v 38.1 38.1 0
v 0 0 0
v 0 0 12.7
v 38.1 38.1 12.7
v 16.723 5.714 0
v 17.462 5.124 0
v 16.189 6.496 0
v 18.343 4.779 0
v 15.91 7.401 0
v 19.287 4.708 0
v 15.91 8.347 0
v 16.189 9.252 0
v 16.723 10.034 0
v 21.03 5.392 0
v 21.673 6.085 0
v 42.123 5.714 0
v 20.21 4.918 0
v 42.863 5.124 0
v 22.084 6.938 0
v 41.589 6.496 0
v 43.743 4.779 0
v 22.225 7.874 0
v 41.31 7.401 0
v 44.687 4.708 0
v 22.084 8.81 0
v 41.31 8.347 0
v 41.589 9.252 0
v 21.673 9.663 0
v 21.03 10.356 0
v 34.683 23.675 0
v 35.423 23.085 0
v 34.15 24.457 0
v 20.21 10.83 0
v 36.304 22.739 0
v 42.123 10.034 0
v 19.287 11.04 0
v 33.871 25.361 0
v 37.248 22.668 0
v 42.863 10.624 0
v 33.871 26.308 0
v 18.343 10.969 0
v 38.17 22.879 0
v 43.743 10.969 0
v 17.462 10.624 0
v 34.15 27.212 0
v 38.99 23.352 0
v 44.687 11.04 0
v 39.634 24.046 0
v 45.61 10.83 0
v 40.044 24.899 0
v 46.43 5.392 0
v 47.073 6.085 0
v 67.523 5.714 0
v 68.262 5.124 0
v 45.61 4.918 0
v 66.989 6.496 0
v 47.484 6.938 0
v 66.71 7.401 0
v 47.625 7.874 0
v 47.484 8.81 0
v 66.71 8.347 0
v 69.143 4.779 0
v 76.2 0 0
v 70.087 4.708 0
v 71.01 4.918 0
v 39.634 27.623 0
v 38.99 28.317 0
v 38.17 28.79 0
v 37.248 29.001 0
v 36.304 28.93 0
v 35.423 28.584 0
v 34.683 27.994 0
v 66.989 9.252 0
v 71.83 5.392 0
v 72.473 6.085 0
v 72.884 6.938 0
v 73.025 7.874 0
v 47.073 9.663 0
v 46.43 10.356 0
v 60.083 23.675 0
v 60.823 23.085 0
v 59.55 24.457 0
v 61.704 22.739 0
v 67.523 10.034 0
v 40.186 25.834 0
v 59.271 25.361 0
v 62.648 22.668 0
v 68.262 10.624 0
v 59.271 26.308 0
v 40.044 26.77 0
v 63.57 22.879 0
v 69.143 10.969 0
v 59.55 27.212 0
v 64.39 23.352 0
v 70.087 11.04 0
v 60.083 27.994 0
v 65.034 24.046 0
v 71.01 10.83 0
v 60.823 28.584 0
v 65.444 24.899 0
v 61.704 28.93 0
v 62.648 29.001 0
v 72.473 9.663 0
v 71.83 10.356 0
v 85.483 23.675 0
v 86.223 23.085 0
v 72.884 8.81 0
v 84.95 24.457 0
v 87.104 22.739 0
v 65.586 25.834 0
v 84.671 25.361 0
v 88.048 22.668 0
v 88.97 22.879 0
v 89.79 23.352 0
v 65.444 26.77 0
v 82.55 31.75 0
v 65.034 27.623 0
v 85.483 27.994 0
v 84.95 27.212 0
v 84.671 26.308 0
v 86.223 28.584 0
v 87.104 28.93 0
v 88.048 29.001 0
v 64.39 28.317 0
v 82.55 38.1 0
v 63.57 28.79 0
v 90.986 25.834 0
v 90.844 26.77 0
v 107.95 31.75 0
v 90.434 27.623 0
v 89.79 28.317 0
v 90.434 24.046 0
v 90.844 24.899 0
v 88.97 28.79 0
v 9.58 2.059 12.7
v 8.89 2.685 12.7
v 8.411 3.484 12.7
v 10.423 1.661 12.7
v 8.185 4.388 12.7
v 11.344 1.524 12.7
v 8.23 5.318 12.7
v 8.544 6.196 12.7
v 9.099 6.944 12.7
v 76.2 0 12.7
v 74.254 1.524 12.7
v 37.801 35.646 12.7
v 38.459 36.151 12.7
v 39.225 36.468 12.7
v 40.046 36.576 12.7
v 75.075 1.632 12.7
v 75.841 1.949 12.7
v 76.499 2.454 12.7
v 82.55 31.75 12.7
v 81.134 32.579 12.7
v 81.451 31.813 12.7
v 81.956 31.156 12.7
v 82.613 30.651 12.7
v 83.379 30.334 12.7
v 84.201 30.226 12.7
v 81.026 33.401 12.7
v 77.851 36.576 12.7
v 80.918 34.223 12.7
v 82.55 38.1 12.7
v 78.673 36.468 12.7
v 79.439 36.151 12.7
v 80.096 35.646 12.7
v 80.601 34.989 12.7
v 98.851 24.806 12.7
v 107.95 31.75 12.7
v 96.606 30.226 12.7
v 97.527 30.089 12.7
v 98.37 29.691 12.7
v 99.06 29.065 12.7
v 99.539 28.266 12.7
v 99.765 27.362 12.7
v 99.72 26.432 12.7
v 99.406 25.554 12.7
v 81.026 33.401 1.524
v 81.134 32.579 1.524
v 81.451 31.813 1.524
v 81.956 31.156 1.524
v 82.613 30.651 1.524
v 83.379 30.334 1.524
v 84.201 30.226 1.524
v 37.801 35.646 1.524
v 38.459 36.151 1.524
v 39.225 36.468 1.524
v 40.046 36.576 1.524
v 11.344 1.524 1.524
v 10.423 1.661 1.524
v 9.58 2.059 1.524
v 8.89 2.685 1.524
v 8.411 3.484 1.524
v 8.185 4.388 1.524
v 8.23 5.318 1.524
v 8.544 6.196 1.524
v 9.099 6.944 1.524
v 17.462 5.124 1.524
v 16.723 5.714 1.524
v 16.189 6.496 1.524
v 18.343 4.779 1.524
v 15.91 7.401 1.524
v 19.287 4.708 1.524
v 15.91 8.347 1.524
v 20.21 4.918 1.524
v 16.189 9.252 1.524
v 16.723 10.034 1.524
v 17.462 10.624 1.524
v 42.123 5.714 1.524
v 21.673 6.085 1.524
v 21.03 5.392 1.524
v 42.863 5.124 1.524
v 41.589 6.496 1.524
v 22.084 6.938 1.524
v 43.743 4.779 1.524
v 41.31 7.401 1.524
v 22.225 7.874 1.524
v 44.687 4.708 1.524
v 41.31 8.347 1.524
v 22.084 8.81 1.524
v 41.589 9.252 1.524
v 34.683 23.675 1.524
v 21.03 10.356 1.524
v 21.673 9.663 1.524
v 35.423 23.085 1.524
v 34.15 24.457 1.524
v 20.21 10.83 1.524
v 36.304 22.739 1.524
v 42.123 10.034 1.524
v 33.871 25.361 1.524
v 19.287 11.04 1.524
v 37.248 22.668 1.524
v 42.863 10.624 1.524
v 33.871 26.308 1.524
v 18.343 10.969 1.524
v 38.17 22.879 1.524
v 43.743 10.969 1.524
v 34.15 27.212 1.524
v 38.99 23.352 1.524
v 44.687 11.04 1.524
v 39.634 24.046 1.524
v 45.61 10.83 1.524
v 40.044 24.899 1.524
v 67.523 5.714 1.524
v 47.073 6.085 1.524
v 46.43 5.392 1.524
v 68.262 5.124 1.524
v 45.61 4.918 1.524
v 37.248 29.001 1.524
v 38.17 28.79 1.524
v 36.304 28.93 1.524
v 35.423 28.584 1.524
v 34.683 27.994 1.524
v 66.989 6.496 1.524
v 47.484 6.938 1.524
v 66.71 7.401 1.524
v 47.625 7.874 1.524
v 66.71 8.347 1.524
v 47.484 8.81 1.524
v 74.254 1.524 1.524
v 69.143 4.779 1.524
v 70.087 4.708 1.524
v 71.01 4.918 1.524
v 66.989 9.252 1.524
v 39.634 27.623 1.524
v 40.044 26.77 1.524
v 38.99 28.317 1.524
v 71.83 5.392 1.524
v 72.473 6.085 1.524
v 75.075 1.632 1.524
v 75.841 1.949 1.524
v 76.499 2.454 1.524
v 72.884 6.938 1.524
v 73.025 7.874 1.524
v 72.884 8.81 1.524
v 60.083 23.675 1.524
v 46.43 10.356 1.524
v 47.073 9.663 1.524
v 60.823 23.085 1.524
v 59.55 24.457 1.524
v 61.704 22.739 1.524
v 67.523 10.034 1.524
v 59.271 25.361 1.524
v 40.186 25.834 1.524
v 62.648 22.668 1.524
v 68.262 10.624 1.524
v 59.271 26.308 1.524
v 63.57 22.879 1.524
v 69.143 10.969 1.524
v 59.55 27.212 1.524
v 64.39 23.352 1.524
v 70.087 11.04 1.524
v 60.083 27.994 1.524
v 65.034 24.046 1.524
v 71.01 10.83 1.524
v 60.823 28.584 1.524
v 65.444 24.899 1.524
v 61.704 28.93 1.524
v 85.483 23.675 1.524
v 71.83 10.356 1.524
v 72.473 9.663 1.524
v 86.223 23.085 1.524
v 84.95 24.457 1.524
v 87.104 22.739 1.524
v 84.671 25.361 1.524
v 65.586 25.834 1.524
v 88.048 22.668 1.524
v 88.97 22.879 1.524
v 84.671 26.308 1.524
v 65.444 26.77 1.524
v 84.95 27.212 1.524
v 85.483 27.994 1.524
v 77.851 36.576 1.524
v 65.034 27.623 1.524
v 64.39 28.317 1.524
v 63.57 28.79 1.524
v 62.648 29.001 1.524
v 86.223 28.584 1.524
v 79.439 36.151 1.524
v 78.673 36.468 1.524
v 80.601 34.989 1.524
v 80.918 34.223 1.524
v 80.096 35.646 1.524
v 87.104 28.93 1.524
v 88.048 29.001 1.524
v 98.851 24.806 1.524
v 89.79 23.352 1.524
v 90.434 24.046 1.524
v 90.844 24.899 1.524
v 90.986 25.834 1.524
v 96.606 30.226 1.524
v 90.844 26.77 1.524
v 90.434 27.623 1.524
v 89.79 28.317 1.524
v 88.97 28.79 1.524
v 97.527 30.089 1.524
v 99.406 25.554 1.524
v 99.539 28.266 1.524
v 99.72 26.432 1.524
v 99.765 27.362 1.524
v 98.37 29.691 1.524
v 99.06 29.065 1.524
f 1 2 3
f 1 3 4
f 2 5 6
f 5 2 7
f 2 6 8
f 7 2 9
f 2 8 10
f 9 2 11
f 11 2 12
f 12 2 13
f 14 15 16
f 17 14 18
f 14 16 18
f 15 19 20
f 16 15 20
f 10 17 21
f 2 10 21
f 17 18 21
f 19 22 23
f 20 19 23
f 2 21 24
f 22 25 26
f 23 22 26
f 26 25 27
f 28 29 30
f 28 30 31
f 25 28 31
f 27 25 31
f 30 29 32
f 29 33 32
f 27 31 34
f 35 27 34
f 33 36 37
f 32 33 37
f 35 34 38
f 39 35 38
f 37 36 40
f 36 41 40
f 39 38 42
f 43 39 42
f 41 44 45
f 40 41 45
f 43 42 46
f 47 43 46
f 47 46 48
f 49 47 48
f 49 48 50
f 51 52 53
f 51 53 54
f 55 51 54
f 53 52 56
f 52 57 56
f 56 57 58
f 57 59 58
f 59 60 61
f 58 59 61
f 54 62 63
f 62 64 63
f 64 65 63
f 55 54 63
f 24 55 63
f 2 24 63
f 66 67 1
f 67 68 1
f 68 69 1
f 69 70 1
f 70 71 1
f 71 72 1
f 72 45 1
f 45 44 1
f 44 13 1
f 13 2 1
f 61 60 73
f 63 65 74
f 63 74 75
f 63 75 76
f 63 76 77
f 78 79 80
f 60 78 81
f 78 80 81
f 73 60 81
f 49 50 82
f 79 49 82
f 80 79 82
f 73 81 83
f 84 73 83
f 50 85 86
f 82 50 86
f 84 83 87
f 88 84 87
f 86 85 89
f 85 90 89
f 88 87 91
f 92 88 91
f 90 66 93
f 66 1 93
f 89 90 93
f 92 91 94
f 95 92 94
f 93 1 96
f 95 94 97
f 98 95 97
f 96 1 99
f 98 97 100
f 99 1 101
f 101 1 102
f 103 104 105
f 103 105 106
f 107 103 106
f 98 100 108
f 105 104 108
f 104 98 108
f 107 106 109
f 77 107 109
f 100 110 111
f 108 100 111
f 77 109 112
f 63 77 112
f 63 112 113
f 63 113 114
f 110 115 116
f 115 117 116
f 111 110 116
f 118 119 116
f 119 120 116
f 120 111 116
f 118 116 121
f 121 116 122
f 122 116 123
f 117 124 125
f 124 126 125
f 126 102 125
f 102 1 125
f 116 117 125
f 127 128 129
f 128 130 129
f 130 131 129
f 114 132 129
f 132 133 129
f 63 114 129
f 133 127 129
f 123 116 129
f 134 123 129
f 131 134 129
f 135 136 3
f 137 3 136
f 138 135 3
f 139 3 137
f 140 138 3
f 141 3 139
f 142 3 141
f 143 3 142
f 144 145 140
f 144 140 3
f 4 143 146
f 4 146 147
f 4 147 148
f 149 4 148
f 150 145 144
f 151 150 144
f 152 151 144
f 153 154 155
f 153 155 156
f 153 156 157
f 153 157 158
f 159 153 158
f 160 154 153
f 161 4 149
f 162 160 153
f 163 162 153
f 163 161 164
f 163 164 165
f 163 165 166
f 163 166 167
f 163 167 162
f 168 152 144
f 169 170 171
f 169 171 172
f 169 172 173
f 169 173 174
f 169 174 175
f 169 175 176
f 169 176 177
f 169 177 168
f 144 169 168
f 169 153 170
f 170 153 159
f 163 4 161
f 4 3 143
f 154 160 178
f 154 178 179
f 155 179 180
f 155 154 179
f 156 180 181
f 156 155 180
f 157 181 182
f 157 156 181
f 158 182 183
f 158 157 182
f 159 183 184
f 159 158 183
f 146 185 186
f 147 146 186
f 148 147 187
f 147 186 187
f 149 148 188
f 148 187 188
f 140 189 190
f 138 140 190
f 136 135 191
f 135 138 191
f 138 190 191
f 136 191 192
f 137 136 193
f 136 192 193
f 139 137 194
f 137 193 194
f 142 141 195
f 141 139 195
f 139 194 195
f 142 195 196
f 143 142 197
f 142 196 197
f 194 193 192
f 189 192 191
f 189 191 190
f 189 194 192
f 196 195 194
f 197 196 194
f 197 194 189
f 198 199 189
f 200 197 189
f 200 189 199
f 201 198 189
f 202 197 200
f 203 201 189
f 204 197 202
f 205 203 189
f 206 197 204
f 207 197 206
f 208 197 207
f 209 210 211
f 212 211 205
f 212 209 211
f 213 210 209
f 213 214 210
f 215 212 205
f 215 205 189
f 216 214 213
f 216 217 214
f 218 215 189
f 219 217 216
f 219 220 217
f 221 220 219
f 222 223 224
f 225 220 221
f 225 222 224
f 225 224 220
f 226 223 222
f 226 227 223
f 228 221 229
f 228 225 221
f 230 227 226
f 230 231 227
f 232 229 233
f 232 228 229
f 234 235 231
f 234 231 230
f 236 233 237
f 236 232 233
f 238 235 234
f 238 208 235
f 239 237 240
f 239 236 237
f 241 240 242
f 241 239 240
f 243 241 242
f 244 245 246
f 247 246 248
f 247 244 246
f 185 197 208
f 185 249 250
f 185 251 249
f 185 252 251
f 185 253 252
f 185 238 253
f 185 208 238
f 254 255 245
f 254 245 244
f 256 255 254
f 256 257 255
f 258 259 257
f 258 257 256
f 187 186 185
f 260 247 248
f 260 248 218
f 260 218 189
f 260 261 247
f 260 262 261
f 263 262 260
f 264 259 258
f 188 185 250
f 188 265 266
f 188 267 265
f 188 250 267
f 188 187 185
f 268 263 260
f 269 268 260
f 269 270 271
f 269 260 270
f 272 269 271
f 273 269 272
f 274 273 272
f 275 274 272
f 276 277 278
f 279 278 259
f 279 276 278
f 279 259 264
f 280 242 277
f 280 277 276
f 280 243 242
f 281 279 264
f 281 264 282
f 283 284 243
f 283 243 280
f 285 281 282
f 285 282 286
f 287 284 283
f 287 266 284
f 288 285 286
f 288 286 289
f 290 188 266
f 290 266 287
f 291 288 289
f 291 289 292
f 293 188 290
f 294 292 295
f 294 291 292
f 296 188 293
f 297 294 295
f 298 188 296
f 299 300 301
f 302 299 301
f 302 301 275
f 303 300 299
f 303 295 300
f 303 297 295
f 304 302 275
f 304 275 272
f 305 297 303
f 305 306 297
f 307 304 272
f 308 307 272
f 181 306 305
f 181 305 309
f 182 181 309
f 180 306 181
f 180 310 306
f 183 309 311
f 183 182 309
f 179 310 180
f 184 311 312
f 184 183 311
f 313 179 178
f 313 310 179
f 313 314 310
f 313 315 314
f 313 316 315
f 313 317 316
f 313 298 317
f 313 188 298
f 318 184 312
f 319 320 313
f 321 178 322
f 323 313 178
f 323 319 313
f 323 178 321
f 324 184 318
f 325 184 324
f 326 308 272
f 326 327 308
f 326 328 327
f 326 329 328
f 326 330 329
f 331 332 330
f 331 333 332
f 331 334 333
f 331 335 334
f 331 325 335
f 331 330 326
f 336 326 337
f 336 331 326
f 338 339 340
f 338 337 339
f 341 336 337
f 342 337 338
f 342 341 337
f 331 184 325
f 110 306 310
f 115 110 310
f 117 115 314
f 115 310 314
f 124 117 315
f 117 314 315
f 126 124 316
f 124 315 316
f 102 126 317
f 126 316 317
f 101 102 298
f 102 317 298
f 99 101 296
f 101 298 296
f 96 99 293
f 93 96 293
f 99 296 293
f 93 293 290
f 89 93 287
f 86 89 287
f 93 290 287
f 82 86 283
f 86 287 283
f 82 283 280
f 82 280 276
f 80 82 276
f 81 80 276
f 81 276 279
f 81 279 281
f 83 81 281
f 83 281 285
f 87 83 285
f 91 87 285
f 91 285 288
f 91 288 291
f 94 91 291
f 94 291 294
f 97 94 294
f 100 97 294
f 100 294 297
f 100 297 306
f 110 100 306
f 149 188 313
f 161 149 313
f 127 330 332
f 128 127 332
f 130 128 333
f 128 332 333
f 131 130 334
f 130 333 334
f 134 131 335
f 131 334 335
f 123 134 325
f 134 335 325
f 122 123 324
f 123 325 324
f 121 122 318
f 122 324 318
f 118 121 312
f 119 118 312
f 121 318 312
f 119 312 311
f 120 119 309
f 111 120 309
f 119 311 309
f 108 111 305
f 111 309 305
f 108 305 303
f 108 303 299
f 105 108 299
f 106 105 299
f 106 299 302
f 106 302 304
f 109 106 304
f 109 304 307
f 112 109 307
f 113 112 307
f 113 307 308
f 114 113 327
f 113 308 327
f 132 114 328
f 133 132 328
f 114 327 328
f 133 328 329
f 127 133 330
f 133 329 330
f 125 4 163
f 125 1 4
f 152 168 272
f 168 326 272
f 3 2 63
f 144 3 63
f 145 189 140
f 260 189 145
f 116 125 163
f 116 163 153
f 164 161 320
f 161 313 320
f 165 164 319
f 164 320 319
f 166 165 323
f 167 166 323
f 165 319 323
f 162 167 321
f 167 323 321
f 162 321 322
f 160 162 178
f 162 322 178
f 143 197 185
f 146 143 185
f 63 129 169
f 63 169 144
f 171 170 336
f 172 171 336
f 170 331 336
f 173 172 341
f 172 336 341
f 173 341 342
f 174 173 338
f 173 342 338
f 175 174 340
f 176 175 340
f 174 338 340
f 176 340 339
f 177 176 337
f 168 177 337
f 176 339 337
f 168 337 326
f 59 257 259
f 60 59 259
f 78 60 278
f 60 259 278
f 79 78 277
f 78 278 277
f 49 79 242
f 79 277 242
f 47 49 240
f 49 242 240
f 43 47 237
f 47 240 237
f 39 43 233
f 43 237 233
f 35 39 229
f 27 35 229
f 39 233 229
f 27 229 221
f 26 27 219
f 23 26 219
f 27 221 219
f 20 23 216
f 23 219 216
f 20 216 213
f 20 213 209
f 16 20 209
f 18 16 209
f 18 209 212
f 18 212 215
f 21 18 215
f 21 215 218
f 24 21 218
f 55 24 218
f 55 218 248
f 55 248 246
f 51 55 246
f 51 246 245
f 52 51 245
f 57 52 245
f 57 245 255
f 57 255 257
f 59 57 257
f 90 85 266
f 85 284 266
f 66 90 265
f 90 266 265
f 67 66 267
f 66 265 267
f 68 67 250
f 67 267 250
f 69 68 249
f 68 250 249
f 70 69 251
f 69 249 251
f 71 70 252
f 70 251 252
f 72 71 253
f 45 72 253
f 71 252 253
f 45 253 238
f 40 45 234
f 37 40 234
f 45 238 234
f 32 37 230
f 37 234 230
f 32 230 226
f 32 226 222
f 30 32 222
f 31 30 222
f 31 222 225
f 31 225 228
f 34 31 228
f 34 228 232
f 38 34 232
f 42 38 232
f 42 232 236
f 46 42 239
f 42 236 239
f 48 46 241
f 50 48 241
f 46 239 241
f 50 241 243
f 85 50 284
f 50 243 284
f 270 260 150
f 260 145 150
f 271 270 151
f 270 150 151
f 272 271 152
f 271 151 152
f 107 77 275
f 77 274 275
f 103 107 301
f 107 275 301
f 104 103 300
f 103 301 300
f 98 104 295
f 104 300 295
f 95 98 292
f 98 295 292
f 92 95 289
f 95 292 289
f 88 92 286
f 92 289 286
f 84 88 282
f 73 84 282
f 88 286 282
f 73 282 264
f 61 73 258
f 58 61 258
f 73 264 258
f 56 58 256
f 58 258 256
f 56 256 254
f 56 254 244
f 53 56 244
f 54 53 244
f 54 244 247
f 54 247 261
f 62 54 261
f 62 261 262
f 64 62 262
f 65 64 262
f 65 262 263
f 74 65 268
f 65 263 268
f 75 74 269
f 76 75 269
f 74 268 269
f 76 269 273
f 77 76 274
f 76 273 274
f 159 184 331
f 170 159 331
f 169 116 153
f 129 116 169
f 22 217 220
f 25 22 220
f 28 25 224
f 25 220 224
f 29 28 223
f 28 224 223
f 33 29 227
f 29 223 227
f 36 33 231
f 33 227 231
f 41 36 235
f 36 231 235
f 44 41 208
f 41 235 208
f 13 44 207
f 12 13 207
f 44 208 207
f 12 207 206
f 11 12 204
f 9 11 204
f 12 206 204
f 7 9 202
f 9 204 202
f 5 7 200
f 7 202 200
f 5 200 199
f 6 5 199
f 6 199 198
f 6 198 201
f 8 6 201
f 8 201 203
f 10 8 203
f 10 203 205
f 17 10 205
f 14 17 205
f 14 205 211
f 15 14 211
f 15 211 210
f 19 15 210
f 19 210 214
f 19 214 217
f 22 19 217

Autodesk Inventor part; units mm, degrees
ref_plane "YZ Plane" through (0, 0, 0) normal (1, 0, 0) x (0, 1, 0)
ref_plane "XZ Plane" through (0, 0, 0) normal (0, 1, 0) x (-1, 0, 0)
ref_plane "XY Plane" through (0, 0, 0) normal (0, 0, 1) x (1, 0, 0)
sketch "Sketch1" plane through (0, 0, 0) normal (0, 0, 1) x (1, 0, 0)
  line L0 (-21.59, 0) -> (129.54, 0) projected
  line L1 (0, -7.62) -> (0, 45.72) projected
  line L2 (0, 0) -> (38.1, 38.1)
  line L3 (38.1, 38.1) -> (82.55, 38.1)
  line L4 (82.55, 38.1) -> (82.55, 31.75)
  line L5 (82.55, 31.75) -> (107.95, 31.75)
  line L6 (107.95, 31.75) -> (76.2, 0)
  line L7 (0, 0) -> (76.2, 0)
  dimension "d0" = 38.1
  dimension "d1" = 45
  dimension "d2" = 76.2
  dimension "d3" = 25.4
  dimension "d27" = 6.35
sketch "Sketch2" plane through (0, 0, 0) normal (0, 0, 1) x (1, 0, 0)
  point P0 (0, 0)
extrude "Extrusion1" add sketch "Sketch1" along normal blind 12.7
shell "Shell1" thickness 1.524 removed faces 1 at (38.1, 12.7, 12.7)
fillet "Fillet1" radius 3.175 6 edges at (38.7313, 36.576, 7.112) (81.026, 36.576, 7.112) (81.026, 30.226, 7.112) (104.2707, 30.226, 7.112) (75.5687, 1.524, 7.112) (3.6793, 1.524, 7.112)
sketch "Sketch3" plane through (11.3444, 1.524, 1.524) normal (0, 0, 1) x (1, 0, 0)
  line L0 (-11.3444, -1.524) -> (64.8556, -1.524) projected
  line L1 (-11.3444, -1.524) -> (7.7056, -1.524)
  line L2 (7.7056, -1.524) -> (7.7056, 6.35)
  circle A0 centre (7.7056, 6.35) radius 3.175
  line L3 (7.7056, 6.35) -> (25.6661, 24.3105) construction
  line L4 (-2.2451, 5.4201) -> (26.4569, 34.1221) projected
  circle A1 centre (25.6661, 24.3105) radius 3.175
  circle A2 centre (33.1056, 6.35) radius 3.175
  circle A3 centre (58.5056, 6.35) radius 3.175
  circle A4 centre (51.0661, 24.3105) radius 3.175
  circle A5 centre (76.4661, 24.3105) radius 3.175
  dimension "d32" = 19.05
  dimension "d33" = 7.874
  dimension "d35" = 25.4
  dimension "d41" = 25.4
  dimension "d42" = 25.4
  dimension "d46" = 6.35
  dimension "d47" = 25.4
  dimension "d48" = 25.4
extrude "Extrusion2" cut sketch "Sketch3" against normal through all
properties part number "Ch4 Part 1"
